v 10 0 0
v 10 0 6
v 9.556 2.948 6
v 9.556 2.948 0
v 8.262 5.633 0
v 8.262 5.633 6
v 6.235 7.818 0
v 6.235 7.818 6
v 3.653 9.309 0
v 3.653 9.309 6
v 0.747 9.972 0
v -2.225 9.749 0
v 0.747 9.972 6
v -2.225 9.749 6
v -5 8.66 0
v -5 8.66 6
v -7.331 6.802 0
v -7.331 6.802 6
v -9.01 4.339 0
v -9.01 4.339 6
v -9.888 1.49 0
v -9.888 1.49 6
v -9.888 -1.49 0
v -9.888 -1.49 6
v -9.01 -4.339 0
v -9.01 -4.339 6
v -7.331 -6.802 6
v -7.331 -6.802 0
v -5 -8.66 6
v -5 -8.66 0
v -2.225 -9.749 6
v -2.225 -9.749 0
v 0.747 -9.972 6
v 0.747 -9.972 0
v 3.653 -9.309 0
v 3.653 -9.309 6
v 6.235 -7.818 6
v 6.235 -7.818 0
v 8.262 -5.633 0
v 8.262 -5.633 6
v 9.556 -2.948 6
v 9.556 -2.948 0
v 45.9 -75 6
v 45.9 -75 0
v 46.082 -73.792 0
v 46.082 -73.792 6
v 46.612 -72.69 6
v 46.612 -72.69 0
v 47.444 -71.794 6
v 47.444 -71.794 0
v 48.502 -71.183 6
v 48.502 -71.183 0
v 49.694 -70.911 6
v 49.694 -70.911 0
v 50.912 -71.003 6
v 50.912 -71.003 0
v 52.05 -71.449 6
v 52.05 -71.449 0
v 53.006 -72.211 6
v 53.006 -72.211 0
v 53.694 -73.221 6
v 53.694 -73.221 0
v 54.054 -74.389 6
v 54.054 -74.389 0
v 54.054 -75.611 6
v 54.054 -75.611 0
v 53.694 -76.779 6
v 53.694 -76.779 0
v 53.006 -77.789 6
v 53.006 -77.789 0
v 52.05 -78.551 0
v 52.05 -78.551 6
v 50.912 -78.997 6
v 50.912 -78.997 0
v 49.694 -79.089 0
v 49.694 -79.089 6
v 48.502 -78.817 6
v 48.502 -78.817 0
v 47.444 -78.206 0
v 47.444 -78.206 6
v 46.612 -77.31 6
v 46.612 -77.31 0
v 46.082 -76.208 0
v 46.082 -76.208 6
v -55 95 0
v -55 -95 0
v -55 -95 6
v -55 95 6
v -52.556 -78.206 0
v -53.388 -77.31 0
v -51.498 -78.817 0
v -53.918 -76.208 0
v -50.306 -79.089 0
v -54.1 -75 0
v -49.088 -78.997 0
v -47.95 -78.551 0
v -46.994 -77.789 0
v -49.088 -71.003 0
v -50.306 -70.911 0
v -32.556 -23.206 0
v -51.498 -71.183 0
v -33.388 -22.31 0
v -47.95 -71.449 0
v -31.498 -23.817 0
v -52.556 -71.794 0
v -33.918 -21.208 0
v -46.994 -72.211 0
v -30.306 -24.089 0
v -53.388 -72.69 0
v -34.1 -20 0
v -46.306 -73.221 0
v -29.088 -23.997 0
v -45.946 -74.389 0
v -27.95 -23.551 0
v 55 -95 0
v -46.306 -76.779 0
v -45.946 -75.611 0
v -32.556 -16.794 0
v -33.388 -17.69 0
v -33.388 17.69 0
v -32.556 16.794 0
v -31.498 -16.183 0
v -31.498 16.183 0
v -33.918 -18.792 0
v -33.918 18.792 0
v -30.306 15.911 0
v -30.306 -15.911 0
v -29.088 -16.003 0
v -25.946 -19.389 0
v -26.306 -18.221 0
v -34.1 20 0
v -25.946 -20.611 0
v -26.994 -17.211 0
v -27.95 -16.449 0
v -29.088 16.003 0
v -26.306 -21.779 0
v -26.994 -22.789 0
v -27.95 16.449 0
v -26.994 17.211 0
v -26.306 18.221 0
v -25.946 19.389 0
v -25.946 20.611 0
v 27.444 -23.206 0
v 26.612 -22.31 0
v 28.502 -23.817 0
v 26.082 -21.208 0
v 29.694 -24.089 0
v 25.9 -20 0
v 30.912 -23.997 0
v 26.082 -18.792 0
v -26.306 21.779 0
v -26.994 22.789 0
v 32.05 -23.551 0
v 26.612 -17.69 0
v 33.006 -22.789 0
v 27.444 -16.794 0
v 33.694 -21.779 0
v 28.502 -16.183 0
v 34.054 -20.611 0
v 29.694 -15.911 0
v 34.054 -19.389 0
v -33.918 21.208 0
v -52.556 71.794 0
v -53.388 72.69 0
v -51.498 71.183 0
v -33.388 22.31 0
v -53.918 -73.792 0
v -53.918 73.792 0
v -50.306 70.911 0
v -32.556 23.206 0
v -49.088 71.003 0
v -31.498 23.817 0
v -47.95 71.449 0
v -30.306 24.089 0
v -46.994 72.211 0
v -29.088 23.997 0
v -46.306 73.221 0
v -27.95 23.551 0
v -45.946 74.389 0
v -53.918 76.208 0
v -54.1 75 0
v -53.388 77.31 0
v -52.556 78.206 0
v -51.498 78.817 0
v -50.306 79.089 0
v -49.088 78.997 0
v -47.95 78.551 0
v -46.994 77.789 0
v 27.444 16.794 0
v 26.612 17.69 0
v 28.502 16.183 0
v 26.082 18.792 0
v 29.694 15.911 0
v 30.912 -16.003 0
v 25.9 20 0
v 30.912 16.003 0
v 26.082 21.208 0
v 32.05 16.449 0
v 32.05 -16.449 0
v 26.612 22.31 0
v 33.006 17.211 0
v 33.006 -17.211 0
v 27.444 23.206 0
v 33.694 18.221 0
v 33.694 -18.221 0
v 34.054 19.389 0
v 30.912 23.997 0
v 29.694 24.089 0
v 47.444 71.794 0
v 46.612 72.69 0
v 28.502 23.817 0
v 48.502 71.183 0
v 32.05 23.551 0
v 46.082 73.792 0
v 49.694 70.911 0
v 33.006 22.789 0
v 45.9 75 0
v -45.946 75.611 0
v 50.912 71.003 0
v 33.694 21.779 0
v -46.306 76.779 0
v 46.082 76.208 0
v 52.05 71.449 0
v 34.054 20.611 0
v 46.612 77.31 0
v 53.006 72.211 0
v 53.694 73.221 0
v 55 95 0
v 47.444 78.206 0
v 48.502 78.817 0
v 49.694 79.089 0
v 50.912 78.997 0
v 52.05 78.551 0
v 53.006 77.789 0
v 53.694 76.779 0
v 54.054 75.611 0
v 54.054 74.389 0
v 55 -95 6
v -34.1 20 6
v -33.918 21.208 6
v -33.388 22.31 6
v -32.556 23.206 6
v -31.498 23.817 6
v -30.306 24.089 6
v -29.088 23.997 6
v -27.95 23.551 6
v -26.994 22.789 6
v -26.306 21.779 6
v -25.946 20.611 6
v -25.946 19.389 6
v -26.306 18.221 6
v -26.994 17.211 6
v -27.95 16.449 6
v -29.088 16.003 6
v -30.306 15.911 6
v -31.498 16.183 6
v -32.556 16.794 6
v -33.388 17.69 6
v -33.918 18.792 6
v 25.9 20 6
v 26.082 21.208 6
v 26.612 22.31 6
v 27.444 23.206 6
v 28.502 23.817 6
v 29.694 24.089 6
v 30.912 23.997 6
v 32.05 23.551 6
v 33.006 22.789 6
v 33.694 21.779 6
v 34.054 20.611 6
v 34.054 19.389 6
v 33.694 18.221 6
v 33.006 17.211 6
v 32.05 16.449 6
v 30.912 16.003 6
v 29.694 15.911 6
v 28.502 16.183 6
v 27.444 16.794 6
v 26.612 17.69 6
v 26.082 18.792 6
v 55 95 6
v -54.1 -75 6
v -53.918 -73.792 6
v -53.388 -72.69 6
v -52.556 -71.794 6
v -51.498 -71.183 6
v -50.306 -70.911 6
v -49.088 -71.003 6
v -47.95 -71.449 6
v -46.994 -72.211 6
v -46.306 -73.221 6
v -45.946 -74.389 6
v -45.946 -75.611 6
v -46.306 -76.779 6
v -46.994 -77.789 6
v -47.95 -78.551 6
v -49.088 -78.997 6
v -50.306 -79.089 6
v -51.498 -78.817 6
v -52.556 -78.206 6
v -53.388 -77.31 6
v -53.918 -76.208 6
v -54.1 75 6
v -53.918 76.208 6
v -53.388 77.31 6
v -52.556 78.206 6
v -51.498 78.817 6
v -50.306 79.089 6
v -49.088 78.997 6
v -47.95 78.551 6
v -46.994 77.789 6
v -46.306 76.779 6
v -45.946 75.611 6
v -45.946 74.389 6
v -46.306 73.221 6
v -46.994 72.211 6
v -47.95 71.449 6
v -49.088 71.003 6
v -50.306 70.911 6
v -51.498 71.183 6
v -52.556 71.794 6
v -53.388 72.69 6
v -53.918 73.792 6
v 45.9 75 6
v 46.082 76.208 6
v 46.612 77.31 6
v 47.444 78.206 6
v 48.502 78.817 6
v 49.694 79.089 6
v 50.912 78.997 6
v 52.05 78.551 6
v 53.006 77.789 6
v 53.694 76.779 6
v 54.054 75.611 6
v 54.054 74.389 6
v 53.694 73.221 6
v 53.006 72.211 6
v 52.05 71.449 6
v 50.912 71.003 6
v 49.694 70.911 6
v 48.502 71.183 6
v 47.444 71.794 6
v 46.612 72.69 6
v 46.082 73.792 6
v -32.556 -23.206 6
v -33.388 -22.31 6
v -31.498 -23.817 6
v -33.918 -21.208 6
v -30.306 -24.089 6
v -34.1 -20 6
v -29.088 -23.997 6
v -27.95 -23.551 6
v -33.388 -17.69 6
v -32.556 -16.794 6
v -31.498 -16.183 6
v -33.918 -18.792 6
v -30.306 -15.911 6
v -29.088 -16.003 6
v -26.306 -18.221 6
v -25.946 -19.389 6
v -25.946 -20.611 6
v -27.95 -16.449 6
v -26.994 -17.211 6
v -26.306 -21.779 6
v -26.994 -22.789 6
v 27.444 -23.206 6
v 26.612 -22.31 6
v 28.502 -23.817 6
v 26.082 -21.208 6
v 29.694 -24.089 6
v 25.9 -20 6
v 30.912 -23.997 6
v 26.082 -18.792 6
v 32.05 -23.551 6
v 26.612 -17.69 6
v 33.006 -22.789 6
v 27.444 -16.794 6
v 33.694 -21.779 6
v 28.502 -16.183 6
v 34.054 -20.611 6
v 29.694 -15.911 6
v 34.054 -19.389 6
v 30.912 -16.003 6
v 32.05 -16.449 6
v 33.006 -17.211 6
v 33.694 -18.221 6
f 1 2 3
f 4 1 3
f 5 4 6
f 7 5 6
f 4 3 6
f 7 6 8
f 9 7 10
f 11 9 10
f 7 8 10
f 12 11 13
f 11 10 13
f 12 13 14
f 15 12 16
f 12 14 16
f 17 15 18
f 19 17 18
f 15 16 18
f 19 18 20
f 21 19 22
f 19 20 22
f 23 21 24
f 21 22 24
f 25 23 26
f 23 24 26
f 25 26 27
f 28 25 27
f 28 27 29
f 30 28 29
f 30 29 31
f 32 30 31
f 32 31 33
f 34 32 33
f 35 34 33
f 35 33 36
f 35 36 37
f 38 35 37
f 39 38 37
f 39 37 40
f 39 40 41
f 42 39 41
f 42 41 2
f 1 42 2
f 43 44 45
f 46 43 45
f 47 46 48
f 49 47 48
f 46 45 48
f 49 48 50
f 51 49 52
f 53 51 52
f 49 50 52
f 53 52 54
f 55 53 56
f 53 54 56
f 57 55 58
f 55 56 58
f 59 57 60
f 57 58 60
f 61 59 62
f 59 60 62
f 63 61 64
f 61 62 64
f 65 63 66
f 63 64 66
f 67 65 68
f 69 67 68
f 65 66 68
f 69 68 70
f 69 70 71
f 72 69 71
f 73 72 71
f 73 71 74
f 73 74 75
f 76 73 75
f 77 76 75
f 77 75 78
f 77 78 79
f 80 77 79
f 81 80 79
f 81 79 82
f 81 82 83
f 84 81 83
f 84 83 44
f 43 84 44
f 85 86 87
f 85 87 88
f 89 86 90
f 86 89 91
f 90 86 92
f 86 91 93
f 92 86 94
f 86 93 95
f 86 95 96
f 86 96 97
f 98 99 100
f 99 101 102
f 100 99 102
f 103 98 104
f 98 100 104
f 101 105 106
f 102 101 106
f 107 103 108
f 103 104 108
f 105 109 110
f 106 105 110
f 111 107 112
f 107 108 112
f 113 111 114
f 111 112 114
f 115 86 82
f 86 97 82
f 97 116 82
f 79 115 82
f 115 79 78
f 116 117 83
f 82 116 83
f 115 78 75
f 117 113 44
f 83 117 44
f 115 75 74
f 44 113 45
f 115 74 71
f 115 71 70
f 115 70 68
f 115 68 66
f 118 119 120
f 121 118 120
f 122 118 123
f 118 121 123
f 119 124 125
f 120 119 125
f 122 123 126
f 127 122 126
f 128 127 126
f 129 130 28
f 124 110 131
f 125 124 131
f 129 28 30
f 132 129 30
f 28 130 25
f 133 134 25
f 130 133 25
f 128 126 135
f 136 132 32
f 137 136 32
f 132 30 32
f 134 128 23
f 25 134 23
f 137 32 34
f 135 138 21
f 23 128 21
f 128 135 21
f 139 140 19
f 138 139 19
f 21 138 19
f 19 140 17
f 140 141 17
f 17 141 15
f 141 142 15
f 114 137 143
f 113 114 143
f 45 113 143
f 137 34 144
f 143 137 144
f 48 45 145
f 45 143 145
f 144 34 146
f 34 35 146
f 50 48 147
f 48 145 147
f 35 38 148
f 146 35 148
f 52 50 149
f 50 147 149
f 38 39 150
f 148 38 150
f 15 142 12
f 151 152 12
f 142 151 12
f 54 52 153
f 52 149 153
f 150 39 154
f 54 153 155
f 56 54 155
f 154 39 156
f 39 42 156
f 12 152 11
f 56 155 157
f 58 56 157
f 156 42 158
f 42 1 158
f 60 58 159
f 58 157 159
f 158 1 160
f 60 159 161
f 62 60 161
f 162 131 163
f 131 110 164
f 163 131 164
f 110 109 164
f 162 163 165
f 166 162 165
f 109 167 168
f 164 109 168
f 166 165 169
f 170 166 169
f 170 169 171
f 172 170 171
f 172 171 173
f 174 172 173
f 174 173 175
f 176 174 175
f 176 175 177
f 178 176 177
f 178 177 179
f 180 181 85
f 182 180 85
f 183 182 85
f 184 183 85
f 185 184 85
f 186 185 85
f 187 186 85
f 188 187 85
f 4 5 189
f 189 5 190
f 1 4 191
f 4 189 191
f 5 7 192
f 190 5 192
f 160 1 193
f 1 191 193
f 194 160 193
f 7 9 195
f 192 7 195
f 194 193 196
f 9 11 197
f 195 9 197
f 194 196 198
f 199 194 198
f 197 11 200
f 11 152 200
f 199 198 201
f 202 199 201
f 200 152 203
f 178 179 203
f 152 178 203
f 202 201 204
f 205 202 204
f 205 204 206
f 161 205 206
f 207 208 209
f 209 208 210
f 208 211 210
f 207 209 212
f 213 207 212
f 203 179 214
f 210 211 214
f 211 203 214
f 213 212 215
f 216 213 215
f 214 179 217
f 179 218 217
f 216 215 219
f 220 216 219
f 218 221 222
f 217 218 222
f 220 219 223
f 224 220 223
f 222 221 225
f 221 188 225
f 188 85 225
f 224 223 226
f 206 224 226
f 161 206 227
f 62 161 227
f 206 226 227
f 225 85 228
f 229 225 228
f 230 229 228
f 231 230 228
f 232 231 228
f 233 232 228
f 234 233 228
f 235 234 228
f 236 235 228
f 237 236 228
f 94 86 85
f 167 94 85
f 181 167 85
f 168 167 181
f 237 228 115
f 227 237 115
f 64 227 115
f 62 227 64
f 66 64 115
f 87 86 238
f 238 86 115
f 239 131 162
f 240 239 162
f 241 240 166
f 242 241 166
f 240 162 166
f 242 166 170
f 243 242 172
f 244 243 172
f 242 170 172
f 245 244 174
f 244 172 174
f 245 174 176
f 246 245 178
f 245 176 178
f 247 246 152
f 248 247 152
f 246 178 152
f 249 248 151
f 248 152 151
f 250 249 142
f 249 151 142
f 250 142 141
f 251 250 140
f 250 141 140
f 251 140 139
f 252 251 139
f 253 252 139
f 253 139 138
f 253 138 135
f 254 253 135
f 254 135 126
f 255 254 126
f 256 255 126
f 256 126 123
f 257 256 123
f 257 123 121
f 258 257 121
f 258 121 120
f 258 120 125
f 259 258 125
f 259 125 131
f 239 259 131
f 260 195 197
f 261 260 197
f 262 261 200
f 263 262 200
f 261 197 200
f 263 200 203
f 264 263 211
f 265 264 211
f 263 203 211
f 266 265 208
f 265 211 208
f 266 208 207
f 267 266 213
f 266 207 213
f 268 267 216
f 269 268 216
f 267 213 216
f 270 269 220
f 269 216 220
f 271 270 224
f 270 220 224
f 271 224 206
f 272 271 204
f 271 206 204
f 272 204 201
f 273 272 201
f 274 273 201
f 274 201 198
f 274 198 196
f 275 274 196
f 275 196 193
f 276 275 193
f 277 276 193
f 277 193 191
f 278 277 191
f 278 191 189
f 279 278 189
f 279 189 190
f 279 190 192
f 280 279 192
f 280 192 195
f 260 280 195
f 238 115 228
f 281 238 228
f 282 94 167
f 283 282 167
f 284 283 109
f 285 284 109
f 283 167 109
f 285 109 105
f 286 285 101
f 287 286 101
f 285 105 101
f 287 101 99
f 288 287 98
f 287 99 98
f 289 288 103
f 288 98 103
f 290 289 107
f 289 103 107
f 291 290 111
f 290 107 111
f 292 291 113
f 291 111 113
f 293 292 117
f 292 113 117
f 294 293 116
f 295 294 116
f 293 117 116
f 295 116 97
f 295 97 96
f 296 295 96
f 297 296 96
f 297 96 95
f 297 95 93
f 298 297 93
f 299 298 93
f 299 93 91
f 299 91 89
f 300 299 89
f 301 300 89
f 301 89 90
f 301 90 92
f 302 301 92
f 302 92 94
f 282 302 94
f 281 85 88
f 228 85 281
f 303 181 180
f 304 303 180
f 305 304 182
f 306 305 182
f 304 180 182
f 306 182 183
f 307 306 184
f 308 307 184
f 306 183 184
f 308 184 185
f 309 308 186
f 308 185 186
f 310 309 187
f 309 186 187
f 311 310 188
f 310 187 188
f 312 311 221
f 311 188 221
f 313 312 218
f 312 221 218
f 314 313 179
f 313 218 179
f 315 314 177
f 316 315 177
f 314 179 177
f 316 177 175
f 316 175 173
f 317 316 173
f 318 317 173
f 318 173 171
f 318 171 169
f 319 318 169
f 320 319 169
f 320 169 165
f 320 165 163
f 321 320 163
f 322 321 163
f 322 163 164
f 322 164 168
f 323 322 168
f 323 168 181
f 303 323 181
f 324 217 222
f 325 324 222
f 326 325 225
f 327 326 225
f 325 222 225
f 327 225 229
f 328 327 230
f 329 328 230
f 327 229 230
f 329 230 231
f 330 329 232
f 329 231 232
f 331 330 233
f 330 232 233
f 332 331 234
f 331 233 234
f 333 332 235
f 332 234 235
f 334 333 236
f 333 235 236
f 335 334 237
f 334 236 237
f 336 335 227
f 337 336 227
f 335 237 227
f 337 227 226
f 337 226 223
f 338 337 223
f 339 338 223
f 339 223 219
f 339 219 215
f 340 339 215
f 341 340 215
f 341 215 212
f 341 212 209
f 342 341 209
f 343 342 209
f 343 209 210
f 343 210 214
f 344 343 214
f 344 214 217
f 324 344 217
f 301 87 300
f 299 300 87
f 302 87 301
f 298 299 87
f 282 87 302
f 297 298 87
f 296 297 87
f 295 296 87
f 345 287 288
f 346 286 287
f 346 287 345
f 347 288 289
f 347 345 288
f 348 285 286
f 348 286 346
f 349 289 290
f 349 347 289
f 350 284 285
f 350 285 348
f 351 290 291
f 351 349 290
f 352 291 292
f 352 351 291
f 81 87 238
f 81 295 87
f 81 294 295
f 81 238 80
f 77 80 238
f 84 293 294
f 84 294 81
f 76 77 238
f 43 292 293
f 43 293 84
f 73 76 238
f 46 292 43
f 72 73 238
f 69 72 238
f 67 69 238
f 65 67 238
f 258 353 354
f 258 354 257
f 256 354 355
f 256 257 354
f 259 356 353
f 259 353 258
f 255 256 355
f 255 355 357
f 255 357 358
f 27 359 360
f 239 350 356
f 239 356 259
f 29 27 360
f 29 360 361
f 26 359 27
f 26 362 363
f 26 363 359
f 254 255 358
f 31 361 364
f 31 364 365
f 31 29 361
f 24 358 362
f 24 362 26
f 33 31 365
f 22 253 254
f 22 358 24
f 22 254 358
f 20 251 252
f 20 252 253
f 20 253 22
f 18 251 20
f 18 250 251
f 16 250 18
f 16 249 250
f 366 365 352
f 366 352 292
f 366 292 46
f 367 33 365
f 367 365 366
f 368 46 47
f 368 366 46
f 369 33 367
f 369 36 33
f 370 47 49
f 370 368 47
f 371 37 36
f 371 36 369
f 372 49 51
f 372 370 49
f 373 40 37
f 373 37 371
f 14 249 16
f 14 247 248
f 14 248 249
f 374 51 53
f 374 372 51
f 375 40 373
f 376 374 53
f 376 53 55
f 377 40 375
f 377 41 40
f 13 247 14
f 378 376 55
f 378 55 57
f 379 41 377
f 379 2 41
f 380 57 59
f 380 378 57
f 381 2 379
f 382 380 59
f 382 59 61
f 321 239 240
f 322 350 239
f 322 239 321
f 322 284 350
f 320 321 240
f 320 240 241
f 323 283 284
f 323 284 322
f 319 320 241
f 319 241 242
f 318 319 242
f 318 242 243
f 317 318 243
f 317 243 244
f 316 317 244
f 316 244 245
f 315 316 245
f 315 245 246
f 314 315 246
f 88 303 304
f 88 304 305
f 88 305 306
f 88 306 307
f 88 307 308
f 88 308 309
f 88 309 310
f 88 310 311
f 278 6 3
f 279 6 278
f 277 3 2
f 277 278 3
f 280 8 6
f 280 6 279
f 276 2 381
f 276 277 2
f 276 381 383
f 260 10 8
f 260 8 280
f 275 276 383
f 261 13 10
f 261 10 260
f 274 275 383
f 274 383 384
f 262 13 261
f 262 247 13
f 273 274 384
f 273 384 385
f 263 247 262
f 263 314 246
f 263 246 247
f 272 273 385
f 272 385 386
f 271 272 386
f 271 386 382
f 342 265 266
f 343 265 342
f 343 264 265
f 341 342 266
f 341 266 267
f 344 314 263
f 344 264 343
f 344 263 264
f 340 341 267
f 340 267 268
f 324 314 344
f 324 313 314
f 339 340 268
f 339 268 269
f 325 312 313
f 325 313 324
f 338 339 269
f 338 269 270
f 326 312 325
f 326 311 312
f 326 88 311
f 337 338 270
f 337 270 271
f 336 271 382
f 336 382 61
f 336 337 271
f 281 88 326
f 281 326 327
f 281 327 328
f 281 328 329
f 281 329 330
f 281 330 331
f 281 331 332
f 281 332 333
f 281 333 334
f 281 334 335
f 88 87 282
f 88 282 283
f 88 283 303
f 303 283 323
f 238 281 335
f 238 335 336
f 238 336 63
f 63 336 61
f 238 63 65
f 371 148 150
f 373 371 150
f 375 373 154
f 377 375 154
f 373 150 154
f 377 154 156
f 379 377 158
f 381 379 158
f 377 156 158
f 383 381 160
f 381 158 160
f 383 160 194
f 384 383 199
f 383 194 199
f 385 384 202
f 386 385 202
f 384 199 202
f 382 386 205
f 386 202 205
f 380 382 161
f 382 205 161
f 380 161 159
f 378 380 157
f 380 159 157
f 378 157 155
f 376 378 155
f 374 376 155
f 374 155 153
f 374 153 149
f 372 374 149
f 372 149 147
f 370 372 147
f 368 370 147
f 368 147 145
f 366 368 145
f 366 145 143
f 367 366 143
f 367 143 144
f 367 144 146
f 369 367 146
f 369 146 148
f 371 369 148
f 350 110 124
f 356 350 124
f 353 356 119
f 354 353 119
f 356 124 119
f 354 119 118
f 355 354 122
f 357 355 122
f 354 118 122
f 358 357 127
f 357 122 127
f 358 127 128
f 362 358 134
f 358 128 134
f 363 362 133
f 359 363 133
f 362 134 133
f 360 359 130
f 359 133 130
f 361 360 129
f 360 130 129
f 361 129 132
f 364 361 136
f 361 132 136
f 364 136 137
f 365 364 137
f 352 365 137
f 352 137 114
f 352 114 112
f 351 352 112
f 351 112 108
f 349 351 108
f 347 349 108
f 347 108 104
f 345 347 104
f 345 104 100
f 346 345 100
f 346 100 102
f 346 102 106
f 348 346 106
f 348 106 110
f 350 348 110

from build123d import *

# Parameters (mm, degrees)
SKETCH1_W                = 110
SKETCH1_H                = 190
BOSS_EXTRUDE1_DEPTH      = 6
M8_CLEARANCE_HOLE1_D     = 8.2
CUT_EXTRUDE1_REACH       = 111.936
SKETCH3_R                = 10
M8_CLEARANCE_HOLE2_D     = 8.2
M8_CLEARANCE_HOLE2_DEPTH = 19.75
M8_CLEARANCE_HOLE2_TIP   = 2.463528538


with BuildPart() as part:
    # Sketch1 → Boss-Extrude1 (new body)
    with BuildSketch(Plane.XY):
        Rectangle(SKETCH1_W, SKETCH1_H)
    extrude(amount=BOSS_EXTRUDE1_DEPTH)

    # M8 Clearance Hole1 (through all)
    with Locations(Plane(origin=(-50, 75, 6), x_dir=(1, 0, 0), z_dir=(0, 0, 1))):
        with Locations((0, 0), (100, 0), (100, -150), (0, -150)):
            Hole(M8_CLEARANCE_HOLE1_D / 2)

    # Sketch3 → Cut-Extrude1 (cut, up to next)
    with BuildSketch(Plane.XY.offset(6), mode=Mode.PRIVATE) as cut_extrude1_sk1:
        Circle(SKETCH3_R)
    cut_extrude1_tool1 = extrude(cut_extrude1_sk1.sketch, amount=-CUT_EXTRUDE1_REACH, mode=Mode.PRIVATE) & part.part
    add(cut_extrude1_tool1.solids().sort_by_distance((0, 0, 6))[0], mode=Mode.SUBTRACT)

    # M8 Clearance Hole2
    with Locations(Plane(origin=(-30, 20, 6), x_dir=(1, 0, 0), z_dir=(0, 0, 1))):
        with Locations((0, 0), (60, 0), (60, -40), (0, -40)):
            Hole(M8_CLEARANCE_HOLE2_D / 2, depth=M8_CLEARANCE_HOLE2_DEPTH)
            with Locations((0, 0, -(M8_CLEARANCE_HOLE2_DEPTH + M8_CLEARANCE_HOLE2_TIP / 2))):  # 118° drill point
                Cone(0, M8_CLEARANCE_HOLE2_D / 2, M8_CLEARANCE_HOLE2_TIP, mode=Mode.SUBTRACT)


solid = part.part
